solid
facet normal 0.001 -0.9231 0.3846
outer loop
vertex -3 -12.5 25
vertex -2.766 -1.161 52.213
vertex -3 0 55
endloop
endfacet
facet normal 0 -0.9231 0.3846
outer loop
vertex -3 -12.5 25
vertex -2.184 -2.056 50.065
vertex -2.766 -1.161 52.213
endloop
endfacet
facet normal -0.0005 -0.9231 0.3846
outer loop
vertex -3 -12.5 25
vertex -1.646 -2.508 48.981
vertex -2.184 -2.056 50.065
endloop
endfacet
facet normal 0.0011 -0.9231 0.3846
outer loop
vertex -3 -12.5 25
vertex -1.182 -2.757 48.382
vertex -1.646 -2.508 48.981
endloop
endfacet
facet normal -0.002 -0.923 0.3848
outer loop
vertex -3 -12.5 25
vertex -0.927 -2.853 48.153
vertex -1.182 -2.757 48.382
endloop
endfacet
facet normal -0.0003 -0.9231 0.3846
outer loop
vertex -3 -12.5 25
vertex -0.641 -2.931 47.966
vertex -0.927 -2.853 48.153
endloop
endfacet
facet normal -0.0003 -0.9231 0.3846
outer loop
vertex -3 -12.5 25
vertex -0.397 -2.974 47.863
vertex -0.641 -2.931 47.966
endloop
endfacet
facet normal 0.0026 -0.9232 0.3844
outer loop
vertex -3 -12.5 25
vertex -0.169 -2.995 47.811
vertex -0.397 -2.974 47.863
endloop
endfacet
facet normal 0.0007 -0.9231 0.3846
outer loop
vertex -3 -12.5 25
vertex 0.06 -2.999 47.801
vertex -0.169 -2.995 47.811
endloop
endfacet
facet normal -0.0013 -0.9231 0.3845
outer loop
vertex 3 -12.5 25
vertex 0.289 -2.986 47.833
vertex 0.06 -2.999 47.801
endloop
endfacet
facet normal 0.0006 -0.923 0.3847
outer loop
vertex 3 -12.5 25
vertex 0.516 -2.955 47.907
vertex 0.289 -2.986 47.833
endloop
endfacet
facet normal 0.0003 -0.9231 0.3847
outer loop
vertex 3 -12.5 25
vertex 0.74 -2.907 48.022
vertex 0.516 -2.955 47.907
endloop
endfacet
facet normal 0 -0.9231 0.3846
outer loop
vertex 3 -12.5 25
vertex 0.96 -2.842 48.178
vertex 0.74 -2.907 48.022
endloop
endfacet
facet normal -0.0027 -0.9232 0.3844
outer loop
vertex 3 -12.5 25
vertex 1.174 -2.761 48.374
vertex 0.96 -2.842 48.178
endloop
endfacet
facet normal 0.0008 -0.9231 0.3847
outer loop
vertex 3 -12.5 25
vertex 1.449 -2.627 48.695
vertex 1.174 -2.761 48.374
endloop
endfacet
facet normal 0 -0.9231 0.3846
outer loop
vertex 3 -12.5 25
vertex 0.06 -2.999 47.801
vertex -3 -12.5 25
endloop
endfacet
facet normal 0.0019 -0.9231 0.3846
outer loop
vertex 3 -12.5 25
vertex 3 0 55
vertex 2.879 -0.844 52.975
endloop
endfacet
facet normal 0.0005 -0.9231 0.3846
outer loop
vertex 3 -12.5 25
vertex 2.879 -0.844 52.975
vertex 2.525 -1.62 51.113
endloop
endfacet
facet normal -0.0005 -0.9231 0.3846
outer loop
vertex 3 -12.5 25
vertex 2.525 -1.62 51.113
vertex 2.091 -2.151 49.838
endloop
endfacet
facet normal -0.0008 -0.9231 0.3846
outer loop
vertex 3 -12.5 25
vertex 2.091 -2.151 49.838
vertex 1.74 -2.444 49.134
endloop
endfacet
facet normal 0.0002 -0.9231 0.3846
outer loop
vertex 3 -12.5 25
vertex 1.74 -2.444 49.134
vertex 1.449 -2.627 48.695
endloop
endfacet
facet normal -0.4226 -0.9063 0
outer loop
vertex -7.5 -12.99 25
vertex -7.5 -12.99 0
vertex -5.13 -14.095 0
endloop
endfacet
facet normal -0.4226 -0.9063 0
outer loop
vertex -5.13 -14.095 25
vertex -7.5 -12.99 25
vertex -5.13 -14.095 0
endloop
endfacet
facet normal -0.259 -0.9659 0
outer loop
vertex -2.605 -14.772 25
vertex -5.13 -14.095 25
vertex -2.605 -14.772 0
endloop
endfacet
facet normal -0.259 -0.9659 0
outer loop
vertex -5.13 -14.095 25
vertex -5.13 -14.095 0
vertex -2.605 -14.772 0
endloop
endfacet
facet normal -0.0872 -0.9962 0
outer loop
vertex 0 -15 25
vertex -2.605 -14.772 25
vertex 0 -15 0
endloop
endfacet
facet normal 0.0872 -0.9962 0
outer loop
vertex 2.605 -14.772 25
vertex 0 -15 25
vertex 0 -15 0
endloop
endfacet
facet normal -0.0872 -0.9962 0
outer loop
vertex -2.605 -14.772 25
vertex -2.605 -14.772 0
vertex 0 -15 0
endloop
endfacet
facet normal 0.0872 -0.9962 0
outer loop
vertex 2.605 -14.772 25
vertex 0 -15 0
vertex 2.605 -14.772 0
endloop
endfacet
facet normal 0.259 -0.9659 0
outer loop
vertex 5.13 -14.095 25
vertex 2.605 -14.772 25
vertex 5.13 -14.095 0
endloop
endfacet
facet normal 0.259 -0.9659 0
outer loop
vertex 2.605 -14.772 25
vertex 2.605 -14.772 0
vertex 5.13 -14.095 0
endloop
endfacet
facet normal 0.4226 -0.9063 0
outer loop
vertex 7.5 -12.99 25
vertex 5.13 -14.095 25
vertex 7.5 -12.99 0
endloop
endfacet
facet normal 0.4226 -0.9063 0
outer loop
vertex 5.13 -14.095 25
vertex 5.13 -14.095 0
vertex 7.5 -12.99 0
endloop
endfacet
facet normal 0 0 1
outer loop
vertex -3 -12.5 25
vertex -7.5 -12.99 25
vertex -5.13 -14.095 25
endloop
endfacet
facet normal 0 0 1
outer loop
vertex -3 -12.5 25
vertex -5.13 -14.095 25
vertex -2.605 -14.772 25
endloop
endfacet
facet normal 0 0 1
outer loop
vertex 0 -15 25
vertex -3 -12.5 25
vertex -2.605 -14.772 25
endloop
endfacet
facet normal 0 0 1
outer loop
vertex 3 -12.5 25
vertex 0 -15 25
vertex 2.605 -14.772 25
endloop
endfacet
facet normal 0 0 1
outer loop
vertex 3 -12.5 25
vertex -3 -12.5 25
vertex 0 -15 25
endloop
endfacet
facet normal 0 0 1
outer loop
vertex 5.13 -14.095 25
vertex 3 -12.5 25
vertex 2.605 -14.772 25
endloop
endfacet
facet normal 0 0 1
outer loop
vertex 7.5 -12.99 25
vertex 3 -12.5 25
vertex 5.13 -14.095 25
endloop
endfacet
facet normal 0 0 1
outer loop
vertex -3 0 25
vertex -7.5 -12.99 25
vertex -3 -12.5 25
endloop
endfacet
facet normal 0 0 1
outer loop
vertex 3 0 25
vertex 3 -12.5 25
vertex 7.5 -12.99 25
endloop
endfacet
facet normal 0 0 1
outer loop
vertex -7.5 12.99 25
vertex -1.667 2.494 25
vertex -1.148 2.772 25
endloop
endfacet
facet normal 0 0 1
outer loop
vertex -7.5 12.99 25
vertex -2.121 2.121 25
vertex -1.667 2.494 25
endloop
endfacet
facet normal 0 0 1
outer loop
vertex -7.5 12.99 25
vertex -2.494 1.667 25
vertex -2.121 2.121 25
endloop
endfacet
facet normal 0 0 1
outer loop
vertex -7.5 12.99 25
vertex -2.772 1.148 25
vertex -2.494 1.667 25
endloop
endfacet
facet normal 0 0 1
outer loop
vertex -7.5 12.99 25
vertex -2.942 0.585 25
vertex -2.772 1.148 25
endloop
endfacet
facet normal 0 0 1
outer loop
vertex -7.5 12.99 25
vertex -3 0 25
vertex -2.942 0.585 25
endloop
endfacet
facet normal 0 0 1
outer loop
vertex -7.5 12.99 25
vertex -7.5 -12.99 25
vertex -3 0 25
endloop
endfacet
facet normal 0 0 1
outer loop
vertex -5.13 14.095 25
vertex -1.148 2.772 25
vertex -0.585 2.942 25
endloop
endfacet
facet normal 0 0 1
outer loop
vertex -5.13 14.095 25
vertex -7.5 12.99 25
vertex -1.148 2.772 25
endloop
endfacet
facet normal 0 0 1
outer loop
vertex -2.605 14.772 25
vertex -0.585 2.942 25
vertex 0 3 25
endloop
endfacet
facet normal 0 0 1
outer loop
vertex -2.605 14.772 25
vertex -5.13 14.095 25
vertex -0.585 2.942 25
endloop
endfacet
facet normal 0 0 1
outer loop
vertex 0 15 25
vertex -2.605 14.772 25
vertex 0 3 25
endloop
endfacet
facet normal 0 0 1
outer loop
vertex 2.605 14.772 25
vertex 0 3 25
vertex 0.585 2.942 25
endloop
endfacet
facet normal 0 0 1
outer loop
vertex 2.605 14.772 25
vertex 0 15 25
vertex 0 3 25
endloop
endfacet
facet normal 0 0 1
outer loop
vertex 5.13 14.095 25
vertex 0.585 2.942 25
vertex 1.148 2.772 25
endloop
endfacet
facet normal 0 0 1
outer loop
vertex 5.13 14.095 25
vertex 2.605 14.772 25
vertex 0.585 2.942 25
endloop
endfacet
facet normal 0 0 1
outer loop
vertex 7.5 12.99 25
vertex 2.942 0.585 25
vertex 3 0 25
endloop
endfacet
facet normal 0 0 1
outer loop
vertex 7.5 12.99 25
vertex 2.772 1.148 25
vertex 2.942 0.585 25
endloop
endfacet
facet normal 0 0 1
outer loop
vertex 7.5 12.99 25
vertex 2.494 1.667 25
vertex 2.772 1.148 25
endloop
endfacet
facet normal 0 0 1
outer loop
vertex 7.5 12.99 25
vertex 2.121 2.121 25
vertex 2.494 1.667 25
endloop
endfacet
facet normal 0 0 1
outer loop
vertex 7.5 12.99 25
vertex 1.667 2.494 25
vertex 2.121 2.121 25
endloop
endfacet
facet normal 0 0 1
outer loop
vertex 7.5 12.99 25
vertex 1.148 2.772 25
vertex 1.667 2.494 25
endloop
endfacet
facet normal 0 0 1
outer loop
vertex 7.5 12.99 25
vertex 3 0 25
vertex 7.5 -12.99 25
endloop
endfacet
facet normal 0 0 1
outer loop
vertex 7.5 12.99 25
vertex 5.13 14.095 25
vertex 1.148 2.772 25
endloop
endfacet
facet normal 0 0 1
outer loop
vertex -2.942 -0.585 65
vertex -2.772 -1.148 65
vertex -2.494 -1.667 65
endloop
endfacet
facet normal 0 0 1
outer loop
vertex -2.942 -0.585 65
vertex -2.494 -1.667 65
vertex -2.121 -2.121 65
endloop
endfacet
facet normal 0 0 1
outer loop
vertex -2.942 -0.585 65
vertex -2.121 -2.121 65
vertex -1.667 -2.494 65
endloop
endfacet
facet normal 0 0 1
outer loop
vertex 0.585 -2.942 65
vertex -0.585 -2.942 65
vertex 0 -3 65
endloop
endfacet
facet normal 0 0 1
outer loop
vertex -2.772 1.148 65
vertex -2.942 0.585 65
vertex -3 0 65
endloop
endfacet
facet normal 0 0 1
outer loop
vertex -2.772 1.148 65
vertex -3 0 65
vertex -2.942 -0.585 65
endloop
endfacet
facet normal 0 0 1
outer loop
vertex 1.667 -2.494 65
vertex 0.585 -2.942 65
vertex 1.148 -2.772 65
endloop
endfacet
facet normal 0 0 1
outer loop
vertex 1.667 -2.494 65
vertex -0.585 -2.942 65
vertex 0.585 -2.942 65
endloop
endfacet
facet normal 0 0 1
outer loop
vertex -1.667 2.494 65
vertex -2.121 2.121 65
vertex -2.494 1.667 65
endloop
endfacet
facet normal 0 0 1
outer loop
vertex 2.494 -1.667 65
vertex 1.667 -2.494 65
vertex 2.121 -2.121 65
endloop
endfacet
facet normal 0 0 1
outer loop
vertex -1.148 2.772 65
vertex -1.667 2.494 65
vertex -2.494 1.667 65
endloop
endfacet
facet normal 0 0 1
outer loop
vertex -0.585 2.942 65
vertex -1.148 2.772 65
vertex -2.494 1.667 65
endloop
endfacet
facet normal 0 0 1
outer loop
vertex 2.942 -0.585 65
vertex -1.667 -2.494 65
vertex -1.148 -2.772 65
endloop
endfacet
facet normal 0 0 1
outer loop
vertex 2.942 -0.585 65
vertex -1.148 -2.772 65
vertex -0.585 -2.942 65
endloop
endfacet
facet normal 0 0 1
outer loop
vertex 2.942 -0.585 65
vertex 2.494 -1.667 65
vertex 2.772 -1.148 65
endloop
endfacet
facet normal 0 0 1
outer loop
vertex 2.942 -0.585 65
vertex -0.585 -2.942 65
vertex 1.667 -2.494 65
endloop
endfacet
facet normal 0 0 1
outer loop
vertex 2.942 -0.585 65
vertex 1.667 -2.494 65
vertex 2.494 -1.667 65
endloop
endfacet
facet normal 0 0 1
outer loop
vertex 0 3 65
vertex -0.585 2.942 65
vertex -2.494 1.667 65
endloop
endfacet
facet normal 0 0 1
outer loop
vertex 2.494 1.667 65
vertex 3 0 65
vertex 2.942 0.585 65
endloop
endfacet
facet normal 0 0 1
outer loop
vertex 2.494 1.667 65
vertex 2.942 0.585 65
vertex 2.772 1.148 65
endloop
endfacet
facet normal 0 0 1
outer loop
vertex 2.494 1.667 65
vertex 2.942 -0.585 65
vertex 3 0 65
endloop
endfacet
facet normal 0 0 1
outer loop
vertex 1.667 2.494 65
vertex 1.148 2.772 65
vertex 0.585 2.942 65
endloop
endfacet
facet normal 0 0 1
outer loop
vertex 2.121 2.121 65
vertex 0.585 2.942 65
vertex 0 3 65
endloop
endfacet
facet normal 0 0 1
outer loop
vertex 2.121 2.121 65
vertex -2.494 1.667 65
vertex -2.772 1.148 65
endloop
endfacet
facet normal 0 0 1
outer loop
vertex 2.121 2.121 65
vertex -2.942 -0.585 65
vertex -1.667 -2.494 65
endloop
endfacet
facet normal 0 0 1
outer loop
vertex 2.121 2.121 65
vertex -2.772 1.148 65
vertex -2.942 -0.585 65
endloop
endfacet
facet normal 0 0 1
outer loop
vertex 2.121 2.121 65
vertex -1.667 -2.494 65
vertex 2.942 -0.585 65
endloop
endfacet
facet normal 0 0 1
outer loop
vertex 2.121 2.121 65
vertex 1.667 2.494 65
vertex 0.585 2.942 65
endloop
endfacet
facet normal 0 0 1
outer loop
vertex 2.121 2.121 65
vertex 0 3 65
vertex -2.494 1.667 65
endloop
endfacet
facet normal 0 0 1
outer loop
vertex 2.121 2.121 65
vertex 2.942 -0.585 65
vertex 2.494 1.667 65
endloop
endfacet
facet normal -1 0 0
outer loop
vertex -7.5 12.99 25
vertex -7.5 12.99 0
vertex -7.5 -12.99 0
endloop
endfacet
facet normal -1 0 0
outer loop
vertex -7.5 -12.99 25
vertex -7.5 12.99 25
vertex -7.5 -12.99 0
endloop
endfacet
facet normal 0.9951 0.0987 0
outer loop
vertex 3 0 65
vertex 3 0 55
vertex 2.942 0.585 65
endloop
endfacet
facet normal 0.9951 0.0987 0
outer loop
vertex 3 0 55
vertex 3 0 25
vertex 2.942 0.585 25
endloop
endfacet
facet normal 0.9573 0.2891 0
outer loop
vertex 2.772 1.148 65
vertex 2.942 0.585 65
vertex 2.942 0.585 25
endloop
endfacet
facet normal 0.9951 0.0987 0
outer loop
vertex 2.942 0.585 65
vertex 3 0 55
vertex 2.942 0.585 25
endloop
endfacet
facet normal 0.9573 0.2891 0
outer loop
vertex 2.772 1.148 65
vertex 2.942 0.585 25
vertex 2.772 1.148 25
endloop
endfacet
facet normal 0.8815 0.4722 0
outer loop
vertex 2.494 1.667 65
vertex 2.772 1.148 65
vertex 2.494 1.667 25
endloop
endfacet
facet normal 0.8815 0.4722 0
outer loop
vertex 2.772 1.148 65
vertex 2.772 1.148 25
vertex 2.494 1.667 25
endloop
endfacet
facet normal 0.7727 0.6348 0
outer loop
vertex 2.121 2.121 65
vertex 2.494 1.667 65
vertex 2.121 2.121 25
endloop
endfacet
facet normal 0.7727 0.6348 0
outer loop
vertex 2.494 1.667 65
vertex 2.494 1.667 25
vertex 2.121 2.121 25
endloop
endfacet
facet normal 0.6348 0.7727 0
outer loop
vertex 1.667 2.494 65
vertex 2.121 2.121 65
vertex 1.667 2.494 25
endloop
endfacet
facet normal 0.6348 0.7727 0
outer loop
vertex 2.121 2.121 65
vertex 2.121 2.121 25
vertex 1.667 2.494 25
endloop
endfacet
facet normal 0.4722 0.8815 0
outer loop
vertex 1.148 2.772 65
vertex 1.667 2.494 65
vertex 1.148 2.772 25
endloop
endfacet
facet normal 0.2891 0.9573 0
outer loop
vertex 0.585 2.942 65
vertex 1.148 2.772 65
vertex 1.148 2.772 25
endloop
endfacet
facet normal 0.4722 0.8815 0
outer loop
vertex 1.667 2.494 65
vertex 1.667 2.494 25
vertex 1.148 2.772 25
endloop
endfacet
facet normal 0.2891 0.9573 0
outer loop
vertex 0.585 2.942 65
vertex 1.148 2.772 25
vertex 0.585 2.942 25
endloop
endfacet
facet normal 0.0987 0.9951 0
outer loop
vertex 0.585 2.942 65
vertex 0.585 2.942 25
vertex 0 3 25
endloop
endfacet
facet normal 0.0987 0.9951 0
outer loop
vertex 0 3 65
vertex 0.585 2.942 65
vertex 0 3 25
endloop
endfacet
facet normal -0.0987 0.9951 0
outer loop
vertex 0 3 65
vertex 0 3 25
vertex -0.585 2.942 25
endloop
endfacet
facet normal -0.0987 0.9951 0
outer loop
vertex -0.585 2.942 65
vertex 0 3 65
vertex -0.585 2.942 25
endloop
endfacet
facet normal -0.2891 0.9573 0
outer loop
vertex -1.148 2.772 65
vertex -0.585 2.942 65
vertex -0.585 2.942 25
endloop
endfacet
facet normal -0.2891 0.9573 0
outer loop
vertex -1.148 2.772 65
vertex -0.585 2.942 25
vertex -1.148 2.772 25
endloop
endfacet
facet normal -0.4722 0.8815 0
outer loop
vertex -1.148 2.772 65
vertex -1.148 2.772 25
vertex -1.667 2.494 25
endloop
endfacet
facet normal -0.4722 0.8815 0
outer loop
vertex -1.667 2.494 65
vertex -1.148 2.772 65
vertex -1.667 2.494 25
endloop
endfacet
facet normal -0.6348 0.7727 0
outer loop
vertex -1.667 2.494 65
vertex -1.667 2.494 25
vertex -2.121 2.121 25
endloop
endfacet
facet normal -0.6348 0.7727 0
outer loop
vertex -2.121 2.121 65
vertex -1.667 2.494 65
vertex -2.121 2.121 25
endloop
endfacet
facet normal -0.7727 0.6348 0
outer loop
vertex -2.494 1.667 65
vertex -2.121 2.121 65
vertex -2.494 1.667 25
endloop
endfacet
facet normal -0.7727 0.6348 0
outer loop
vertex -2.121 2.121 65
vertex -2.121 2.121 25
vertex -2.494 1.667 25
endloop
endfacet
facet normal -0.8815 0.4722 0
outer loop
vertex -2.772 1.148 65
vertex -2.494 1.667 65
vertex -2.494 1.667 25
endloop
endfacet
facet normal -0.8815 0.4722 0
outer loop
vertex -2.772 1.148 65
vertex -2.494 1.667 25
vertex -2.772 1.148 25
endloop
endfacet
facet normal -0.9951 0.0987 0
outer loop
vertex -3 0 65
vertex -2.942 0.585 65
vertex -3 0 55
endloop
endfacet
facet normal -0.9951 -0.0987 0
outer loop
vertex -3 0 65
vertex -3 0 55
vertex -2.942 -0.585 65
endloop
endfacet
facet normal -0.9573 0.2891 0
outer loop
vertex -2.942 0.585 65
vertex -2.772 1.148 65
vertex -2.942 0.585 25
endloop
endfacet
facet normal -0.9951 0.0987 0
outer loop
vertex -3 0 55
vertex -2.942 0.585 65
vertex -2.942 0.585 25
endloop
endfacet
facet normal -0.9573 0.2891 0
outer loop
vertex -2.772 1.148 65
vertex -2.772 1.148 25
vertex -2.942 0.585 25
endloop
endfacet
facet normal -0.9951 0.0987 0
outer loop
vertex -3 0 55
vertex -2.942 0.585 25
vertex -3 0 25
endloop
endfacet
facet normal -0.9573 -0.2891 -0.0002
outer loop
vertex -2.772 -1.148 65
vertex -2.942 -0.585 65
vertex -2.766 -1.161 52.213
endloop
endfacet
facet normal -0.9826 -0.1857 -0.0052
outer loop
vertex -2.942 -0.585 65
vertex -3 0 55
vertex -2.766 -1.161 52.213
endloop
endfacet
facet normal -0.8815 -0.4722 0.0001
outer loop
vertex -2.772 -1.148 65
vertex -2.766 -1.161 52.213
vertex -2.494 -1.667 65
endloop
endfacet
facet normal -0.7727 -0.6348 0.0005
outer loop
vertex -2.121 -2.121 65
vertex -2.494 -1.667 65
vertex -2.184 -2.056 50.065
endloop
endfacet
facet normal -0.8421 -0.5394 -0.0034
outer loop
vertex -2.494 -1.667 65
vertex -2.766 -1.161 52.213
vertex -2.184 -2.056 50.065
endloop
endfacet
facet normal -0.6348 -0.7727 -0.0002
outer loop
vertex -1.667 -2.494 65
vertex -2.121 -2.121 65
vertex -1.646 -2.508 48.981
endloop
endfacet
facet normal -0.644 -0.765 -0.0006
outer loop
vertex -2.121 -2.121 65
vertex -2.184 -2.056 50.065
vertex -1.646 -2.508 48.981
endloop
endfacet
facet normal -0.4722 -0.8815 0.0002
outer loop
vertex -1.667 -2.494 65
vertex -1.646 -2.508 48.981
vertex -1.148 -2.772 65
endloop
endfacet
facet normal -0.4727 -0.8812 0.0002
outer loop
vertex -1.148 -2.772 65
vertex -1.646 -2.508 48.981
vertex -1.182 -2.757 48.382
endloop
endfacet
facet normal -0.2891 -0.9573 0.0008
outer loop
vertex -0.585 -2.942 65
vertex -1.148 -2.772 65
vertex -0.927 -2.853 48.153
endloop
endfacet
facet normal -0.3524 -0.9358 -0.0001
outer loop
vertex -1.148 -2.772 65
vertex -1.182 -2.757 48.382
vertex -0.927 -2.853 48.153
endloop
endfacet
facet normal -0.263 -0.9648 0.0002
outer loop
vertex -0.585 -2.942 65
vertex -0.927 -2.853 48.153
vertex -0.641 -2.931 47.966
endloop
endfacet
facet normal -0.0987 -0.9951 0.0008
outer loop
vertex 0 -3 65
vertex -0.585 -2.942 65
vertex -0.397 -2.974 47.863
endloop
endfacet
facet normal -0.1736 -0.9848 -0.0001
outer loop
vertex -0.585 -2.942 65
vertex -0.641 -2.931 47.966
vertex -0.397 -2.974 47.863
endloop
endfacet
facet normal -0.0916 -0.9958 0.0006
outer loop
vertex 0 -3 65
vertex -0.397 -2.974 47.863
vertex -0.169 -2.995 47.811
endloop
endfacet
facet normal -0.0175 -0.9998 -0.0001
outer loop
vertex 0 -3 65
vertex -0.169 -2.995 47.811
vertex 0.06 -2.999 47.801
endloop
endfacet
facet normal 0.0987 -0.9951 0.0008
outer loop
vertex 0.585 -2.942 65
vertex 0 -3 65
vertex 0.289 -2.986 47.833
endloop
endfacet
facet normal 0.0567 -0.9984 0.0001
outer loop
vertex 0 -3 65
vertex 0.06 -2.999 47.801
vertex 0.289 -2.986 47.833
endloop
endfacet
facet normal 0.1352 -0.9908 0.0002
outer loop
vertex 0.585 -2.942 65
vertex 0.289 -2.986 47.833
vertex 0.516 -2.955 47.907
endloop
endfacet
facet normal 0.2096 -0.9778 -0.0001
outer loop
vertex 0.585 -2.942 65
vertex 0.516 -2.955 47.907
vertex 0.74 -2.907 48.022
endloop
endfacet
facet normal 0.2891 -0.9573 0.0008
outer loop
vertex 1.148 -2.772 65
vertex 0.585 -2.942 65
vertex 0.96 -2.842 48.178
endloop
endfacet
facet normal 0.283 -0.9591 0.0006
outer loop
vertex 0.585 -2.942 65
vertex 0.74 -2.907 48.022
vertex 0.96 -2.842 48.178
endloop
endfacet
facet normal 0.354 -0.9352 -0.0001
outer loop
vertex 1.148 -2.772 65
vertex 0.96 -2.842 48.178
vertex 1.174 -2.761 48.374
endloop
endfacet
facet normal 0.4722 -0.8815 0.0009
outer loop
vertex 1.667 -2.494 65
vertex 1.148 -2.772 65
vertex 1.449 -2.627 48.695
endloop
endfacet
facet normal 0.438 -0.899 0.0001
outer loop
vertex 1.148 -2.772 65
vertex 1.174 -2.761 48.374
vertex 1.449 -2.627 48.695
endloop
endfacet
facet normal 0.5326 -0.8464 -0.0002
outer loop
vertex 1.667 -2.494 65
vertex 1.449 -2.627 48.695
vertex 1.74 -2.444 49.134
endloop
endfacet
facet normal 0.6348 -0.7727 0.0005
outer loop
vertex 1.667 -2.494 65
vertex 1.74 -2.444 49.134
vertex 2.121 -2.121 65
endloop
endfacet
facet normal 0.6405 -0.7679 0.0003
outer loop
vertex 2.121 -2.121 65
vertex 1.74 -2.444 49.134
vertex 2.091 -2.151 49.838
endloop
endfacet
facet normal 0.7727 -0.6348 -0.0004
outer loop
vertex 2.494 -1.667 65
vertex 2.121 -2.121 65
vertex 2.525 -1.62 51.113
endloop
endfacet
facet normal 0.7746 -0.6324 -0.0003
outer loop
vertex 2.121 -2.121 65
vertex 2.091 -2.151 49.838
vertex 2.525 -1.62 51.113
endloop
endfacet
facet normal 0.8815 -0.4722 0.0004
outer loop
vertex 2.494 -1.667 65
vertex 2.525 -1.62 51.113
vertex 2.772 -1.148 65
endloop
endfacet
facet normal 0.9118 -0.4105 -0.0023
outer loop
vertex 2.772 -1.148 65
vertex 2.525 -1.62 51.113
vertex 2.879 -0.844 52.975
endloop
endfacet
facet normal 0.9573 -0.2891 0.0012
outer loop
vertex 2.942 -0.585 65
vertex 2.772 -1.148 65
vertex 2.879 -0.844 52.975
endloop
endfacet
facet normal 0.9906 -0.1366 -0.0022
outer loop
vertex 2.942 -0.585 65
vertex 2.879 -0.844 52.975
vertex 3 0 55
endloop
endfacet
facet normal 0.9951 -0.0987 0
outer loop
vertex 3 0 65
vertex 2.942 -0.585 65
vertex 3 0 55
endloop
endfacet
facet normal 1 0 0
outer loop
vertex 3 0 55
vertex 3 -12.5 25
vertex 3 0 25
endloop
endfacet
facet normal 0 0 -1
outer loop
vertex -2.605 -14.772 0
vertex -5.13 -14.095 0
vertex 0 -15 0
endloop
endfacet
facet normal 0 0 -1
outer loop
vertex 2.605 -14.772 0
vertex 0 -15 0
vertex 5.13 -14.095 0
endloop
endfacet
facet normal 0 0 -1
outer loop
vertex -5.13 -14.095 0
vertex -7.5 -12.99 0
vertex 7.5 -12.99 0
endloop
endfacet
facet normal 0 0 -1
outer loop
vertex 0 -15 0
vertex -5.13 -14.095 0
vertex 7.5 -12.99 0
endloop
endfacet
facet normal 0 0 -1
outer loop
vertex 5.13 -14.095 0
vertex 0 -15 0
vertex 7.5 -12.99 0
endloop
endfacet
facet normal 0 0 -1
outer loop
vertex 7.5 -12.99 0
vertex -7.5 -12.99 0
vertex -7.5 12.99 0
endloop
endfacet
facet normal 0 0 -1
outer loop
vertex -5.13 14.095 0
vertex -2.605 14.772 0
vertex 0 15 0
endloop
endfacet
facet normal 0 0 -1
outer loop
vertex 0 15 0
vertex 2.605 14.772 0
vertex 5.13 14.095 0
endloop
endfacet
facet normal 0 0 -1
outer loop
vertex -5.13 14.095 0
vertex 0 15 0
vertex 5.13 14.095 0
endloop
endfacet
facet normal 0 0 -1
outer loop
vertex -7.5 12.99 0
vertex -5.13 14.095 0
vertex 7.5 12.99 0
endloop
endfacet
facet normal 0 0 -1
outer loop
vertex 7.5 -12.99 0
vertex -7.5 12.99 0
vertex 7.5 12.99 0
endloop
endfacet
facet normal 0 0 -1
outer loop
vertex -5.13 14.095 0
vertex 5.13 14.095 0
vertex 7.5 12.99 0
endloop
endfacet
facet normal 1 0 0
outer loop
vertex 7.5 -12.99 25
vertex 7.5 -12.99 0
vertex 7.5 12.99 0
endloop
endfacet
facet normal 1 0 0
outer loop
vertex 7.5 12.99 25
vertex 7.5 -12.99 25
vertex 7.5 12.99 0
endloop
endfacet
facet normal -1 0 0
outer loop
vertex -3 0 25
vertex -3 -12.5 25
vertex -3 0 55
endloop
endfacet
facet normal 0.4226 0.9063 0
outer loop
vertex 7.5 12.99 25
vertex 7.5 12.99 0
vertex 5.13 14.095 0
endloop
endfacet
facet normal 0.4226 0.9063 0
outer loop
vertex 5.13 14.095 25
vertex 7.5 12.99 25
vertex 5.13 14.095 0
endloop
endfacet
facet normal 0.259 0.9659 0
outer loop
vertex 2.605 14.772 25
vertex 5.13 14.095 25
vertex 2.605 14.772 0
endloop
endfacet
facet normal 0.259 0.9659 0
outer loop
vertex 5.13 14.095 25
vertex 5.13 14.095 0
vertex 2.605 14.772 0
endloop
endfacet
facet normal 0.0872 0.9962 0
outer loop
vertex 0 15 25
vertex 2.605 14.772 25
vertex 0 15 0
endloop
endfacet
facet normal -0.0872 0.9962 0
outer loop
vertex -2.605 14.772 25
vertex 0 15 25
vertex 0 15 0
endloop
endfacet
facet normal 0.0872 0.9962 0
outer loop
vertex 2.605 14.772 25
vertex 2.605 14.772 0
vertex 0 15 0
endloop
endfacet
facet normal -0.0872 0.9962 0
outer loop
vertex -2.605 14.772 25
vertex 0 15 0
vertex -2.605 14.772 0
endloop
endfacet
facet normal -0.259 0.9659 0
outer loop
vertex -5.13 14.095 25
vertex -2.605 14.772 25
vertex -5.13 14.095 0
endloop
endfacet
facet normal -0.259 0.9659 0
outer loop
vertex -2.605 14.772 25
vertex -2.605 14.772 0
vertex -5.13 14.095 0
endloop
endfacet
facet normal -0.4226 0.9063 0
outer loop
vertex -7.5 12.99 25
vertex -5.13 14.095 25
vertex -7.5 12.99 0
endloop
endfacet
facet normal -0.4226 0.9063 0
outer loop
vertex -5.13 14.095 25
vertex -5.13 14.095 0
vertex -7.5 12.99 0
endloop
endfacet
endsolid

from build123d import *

# Parameters (mm, degrees)
F0_R     = 3
F1_DEPTH = 25
F2_DEPTH = 65
F4_DEPTH = 3


with BuildPart() as f1:
    # F0 (on Top) → F1 (new body)
    with BuildSketch(Plane.XY):
        with BuildLine():
            Line((7.5, -12.990381), (7.5, 12.990381))
            ThreePointArc((7.5, 12.990381), (0, 15), (-7.5, 12.990381))
            Line((-7.5, 12.990381), (-7.5, -12.990381))
            ThreePointArc((-7.5, -12.990381), (0, -15), (7.5, -12.990381))
        make_face()
        Circle(F0_R, mode=Mode.SUBTRACT)
    extrude(amount=F1_DEPTH)

    # F0 (on Top) → F2 (join)
    with BuildSketch(Plane.XY):
        Circle(F0_R)
    extrude(amount=F2_DEPTH)

    # F3 (on Right) → F4 (join, symmetric)
    with BuildSketch(Plane.YZ):
        Polygon((-12.5, 25), (0, 25), (0, 55), align=None)
    extrude(amount=F4_DEPTH, both=True)


solid = f1.part
